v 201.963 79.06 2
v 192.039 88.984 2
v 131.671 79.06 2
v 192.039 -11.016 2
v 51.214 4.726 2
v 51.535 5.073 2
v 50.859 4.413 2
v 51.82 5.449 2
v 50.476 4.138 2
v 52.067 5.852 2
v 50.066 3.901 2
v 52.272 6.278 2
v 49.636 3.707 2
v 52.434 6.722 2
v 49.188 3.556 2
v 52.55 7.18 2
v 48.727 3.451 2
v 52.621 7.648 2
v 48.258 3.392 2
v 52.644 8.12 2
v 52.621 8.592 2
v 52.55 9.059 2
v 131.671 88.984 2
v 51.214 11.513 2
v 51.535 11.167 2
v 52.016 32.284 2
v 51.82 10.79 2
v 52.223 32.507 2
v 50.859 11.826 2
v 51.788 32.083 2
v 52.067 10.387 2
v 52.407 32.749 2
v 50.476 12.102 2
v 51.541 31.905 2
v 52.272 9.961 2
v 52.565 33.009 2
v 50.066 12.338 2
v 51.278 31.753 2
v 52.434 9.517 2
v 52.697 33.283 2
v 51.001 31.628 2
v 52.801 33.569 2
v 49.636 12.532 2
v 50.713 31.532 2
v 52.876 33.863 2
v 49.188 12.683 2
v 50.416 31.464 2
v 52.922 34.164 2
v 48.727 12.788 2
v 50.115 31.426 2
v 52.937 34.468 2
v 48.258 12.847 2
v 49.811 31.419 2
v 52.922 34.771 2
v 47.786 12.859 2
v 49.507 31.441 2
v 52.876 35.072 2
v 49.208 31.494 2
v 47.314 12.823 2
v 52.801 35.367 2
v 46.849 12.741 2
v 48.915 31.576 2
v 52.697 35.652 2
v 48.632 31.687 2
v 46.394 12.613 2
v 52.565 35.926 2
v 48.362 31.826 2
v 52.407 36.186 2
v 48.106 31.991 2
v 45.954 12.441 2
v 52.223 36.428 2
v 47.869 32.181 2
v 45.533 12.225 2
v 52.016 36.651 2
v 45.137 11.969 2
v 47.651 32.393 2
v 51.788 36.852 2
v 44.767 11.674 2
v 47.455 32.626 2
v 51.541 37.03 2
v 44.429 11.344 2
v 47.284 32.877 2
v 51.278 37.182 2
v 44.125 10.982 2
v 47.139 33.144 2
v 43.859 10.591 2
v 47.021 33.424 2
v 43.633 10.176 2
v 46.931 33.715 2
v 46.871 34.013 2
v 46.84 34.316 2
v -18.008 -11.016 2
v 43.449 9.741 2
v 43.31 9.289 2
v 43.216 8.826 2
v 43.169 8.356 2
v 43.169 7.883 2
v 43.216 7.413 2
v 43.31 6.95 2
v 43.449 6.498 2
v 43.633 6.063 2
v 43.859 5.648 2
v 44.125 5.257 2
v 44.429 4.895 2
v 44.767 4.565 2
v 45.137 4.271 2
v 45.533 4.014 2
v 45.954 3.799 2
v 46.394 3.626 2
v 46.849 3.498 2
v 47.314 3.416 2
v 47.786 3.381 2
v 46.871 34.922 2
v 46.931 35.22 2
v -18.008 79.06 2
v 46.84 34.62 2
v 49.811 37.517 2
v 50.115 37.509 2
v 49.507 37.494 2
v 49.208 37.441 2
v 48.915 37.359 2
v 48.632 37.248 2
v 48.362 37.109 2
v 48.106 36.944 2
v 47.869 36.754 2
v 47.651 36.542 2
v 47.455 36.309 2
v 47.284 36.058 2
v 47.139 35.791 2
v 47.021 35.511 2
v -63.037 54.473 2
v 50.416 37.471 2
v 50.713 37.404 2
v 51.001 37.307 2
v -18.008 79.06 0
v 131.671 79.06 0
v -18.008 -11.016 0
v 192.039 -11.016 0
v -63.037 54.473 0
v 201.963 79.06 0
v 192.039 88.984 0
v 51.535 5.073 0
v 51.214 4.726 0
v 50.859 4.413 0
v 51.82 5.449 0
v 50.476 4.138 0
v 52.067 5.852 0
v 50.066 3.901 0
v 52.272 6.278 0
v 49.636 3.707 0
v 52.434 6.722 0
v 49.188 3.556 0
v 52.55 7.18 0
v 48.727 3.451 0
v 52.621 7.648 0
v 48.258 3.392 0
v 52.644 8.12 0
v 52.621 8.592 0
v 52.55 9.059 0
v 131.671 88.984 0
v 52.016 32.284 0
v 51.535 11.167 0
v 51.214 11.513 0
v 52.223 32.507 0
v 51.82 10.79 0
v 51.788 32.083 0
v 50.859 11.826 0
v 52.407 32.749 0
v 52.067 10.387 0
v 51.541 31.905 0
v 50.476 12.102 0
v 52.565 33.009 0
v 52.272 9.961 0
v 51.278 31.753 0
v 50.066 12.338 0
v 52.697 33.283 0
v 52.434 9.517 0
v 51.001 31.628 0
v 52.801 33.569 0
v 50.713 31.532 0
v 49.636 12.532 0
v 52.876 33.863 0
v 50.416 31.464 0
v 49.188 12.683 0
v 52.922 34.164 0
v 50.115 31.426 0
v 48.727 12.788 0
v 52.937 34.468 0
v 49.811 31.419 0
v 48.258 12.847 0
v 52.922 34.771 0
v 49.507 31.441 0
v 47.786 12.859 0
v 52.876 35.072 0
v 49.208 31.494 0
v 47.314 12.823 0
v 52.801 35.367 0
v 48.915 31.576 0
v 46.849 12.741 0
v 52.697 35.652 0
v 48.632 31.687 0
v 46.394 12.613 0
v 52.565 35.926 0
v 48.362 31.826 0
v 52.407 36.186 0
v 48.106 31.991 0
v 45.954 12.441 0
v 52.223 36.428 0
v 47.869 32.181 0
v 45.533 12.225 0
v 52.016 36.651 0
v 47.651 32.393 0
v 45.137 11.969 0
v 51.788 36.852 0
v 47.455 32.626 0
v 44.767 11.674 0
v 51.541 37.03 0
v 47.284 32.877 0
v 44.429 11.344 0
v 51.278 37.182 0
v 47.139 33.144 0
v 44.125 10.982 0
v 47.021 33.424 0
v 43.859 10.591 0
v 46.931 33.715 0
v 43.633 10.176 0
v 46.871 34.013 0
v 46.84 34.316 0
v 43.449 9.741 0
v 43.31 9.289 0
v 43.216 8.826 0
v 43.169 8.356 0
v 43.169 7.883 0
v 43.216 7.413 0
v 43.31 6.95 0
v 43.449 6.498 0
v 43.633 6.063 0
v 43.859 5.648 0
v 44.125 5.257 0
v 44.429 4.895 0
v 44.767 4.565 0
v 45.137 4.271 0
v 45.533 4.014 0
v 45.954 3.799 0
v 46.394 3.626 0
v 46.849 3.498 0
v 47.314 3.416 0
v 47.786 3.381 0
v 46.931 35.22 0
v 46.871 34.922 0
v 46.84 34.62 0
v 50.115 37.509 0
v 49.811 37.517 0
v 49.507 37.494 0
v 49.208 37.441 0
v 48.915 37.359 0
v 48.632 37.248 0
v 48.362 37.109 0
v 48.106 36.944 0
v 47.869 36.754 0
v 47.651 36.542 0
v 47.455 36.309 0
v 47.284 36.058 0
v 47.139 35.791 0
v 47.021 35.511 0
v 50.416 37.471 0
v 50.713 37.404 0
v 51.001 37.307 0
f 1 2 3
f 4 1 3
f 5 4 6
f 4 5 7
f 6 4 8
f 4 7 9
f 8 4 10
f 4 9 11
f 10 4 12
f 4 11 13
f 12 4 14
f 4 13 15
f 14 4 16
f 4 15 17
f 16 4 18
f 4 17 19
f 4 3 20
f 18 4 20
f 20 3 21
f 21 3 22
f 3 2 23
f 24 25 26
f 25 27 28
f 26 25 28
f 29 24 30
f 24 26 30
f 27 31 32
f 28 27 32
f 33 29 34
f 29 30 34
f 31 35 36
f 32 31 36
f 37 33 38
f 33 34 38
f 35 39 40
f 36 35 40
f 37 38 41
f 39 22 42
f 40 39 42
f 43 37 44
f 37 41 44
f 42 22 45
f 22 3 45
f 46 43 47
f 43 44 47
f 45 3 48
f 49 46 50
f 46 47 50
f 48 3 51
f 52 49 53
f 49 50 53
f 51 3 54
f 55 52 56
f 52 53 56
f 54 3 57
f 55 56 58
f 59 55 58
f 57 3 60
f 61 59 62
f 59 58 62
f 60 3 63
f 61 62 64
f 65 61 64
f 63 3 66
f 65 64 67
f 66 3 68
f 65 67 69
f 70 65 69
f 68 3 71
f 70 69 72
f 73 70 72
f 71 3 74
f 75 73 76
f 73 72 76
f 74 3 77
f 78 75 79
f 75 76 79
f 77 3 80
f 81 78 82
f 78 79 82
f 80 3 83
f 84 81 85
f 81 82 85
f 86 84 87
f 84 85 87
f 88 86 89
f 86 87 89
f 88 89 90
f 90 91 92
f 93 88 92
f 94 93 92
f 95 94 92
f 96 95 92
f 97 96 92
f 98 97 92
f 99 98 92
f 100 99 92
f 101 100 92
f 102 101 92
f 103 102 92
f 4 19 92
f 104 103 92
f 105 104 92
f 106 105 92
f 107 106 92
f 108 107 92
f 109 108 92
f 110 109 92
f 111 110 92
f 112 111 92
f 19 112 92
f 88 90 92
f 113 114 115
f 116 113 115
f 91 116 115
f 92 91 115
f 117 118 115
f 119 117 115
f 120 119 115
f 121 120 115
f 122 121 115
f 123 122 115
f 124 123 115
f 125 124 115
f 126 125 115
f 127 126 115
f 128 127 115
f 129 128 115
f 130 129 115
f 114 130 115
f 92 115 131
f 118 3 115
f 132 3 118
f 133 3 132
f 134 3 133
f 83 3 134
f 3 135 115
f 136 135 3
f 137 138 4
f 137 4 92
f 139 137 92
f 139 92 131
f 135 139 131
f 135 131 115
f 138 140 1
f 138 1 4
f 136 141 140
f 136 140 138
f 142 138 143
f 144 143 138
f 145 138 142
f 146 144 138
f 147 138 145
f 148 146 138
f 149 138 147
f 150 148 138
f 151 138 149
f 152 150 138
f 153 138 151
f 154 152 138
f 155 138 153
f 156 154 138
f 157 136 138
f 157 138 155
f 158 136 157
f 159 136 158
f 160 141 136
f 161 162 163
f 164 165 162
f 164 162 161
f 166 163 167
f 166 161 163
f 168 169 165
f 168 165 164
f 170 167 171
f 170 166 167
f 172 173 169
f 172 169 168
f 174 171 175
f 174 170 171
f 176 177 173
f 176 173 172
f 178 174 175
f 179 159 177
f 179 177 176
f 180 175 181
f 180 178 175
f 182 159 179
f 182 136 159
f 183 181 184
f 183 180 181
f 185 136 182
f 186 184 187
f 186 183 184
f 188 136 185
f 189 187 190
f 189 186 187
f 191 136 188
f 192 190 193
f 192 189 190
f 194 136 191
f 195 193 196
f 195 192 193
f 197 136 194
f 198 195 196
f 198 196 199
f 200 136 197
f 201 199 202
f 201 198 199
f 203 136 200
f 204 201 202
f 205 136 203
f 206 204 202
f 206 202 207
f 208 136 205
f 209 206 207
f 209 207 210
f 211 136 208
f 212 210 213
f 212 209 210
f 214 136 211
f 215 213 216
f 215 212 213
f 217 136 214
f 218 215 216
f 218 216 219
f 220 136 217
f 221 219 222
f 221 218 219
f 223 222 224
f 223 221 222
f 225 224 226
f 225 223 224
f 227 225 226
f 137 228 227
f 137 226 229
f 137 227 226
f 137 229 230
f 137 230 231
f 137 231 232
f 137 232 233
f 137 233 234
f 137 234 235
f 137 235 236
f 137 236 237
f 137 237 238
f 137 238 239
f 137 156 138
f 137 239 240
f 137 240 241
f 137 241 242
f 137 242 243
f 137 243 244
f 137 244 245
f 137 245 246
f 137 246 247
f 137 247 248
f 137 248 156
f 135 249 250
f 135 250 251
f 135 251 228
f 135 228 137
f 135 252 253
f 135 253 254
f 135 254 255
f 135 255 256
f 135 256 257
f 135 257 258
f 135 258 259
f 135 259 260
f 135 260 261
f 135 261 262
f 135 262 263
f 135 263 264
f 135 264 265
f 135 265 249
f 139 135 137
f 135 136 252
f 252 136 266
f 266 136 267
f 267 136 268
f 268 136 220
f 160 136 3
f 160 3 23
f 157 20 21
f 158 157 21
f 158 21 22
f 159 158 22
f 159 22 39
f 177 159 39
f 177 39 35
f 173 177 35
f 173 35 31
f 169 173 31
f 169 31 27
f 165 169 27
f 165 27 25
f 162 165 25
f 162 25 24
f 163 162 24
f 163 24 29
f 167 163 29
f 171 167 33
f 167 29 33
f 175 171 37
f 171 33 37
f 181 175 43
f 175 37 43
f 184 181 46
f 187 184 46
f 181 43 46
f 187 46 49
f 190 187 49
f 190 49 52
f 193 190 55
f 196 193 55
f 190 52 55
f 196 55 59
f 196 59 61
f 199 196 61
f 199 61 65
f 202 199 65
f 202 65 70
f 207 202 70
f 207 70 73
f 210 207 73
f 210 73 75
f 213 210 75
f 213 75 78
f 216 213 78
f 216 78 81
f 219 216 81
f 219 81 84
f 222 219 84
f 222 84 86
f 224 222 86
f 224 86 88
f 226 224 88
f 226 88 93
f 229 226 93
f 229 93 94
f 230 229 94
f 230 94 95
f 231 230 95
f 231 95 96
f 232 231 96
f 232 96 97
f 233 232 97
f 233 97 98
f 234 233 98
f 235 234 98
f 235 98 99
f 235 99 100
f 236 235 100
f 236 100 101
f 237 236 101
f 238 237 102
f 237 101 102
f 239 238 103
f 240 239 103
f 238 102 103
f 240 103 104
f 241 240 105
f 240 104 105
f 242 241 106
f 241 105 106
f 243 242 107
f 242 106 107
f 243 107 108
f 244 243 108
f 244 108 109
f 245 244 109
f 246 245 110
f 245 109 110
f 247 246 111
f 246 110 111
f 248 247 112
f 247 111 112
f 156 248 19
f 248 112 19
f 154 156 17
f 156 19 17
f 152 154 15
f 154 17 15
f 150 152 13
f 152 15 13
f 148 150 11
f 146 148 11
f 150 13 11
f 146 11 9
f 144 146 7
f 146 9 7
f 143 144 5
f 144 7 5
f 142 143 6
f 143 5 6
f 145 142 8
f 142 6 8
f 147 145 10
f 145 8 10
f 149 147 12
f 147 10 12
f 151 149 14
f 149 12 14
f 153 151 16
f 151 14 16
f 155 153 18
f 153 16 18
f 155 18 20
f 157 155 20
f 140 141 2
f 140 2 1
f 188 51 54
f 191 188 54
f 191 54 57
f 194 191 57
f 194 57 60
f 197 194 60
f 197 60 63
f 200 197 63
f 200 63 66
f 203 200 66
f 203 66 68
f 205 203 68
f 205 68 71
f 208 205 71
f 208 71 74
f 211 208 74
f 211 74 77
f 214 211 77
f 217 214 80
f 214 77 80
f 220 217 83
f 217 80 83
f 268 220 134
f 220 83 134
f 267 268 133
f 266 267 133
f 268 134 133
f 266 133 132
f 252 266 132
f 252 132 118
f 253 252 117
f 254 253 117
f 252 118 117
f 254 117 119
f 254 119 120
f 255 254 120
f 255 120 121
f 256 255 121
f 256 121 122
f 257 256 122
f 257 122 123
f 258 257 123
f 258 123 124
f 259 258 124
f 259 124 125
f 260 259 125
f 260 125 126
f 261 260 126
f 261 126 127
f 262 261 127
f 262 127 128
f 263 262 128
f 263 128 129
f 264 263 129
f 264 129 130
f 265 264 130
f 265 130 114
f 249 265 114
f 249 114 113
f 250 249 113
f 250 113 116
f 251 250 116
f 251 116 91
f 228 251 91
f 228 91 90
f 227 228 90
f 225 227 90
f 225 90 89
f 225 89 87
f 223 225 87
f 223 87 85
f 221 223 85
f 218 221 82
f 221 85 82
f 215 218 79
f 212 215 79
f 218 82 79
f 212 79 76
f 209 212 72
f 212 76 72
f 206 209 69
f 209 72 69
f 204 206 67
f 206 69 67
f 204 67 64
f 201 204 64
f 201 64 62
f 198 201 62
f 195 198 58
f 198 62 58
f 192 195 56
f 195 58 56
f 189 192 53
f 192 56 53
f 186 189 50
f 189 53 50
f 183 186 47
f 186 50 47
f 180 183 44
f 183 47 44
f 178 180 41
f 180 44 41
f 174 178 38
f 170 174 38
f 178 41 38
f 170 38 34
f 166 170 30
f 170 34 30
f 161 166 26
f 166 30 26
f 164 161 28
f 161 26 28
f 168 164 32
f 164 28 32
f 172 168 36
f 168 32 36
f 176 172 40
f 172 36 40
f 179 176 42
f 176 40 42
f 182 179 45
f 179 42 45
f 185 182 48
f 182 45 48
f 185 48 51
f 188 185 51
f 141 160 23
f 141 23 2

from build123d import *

# Parameters (mm, degrees)
BOSS_EXTRUDE1_DEPTH = 2
SKETCH2_R           = 3.05
SKETCH2_R_2         = 4.740417633
CUT_EXTRUDE1_DEPTH  = 10


with BuildPart() as part:
    # Sketch1 → Boss-Extrude1 (new body)
    with BuildSketch(Plane.XY):
        Polygon((192.039285274, 88.983833718), (201.963048499, 79.060070494), (192.039285274, -11.016166282), (-18.008037477, -11.016166282), (-63.036951501, 54.472600305), (-18.008037477, 79.060070494), (131.67120814, 79.060070494), (131.67120814, 88.983833718), align=None)
    extrude(amount=BOSS_EXTRUDE1_DEPTH)

    # Sketch2 → Cut-Extrude1 (cut)
    with BuildSketch(Plane.XY.offset(2)):
        with Locations((49.886677935, 34.46755227)):
            Circle(SKETCH2_R)
        with Locations((47.903695827, 8.119584274)):
            Circle(SKETCH2_R_2)
    extrude(amount=-CUT_EXTRUDE1_DEPTH, mode=Mode.SUBTRACT)


solid = part.part
